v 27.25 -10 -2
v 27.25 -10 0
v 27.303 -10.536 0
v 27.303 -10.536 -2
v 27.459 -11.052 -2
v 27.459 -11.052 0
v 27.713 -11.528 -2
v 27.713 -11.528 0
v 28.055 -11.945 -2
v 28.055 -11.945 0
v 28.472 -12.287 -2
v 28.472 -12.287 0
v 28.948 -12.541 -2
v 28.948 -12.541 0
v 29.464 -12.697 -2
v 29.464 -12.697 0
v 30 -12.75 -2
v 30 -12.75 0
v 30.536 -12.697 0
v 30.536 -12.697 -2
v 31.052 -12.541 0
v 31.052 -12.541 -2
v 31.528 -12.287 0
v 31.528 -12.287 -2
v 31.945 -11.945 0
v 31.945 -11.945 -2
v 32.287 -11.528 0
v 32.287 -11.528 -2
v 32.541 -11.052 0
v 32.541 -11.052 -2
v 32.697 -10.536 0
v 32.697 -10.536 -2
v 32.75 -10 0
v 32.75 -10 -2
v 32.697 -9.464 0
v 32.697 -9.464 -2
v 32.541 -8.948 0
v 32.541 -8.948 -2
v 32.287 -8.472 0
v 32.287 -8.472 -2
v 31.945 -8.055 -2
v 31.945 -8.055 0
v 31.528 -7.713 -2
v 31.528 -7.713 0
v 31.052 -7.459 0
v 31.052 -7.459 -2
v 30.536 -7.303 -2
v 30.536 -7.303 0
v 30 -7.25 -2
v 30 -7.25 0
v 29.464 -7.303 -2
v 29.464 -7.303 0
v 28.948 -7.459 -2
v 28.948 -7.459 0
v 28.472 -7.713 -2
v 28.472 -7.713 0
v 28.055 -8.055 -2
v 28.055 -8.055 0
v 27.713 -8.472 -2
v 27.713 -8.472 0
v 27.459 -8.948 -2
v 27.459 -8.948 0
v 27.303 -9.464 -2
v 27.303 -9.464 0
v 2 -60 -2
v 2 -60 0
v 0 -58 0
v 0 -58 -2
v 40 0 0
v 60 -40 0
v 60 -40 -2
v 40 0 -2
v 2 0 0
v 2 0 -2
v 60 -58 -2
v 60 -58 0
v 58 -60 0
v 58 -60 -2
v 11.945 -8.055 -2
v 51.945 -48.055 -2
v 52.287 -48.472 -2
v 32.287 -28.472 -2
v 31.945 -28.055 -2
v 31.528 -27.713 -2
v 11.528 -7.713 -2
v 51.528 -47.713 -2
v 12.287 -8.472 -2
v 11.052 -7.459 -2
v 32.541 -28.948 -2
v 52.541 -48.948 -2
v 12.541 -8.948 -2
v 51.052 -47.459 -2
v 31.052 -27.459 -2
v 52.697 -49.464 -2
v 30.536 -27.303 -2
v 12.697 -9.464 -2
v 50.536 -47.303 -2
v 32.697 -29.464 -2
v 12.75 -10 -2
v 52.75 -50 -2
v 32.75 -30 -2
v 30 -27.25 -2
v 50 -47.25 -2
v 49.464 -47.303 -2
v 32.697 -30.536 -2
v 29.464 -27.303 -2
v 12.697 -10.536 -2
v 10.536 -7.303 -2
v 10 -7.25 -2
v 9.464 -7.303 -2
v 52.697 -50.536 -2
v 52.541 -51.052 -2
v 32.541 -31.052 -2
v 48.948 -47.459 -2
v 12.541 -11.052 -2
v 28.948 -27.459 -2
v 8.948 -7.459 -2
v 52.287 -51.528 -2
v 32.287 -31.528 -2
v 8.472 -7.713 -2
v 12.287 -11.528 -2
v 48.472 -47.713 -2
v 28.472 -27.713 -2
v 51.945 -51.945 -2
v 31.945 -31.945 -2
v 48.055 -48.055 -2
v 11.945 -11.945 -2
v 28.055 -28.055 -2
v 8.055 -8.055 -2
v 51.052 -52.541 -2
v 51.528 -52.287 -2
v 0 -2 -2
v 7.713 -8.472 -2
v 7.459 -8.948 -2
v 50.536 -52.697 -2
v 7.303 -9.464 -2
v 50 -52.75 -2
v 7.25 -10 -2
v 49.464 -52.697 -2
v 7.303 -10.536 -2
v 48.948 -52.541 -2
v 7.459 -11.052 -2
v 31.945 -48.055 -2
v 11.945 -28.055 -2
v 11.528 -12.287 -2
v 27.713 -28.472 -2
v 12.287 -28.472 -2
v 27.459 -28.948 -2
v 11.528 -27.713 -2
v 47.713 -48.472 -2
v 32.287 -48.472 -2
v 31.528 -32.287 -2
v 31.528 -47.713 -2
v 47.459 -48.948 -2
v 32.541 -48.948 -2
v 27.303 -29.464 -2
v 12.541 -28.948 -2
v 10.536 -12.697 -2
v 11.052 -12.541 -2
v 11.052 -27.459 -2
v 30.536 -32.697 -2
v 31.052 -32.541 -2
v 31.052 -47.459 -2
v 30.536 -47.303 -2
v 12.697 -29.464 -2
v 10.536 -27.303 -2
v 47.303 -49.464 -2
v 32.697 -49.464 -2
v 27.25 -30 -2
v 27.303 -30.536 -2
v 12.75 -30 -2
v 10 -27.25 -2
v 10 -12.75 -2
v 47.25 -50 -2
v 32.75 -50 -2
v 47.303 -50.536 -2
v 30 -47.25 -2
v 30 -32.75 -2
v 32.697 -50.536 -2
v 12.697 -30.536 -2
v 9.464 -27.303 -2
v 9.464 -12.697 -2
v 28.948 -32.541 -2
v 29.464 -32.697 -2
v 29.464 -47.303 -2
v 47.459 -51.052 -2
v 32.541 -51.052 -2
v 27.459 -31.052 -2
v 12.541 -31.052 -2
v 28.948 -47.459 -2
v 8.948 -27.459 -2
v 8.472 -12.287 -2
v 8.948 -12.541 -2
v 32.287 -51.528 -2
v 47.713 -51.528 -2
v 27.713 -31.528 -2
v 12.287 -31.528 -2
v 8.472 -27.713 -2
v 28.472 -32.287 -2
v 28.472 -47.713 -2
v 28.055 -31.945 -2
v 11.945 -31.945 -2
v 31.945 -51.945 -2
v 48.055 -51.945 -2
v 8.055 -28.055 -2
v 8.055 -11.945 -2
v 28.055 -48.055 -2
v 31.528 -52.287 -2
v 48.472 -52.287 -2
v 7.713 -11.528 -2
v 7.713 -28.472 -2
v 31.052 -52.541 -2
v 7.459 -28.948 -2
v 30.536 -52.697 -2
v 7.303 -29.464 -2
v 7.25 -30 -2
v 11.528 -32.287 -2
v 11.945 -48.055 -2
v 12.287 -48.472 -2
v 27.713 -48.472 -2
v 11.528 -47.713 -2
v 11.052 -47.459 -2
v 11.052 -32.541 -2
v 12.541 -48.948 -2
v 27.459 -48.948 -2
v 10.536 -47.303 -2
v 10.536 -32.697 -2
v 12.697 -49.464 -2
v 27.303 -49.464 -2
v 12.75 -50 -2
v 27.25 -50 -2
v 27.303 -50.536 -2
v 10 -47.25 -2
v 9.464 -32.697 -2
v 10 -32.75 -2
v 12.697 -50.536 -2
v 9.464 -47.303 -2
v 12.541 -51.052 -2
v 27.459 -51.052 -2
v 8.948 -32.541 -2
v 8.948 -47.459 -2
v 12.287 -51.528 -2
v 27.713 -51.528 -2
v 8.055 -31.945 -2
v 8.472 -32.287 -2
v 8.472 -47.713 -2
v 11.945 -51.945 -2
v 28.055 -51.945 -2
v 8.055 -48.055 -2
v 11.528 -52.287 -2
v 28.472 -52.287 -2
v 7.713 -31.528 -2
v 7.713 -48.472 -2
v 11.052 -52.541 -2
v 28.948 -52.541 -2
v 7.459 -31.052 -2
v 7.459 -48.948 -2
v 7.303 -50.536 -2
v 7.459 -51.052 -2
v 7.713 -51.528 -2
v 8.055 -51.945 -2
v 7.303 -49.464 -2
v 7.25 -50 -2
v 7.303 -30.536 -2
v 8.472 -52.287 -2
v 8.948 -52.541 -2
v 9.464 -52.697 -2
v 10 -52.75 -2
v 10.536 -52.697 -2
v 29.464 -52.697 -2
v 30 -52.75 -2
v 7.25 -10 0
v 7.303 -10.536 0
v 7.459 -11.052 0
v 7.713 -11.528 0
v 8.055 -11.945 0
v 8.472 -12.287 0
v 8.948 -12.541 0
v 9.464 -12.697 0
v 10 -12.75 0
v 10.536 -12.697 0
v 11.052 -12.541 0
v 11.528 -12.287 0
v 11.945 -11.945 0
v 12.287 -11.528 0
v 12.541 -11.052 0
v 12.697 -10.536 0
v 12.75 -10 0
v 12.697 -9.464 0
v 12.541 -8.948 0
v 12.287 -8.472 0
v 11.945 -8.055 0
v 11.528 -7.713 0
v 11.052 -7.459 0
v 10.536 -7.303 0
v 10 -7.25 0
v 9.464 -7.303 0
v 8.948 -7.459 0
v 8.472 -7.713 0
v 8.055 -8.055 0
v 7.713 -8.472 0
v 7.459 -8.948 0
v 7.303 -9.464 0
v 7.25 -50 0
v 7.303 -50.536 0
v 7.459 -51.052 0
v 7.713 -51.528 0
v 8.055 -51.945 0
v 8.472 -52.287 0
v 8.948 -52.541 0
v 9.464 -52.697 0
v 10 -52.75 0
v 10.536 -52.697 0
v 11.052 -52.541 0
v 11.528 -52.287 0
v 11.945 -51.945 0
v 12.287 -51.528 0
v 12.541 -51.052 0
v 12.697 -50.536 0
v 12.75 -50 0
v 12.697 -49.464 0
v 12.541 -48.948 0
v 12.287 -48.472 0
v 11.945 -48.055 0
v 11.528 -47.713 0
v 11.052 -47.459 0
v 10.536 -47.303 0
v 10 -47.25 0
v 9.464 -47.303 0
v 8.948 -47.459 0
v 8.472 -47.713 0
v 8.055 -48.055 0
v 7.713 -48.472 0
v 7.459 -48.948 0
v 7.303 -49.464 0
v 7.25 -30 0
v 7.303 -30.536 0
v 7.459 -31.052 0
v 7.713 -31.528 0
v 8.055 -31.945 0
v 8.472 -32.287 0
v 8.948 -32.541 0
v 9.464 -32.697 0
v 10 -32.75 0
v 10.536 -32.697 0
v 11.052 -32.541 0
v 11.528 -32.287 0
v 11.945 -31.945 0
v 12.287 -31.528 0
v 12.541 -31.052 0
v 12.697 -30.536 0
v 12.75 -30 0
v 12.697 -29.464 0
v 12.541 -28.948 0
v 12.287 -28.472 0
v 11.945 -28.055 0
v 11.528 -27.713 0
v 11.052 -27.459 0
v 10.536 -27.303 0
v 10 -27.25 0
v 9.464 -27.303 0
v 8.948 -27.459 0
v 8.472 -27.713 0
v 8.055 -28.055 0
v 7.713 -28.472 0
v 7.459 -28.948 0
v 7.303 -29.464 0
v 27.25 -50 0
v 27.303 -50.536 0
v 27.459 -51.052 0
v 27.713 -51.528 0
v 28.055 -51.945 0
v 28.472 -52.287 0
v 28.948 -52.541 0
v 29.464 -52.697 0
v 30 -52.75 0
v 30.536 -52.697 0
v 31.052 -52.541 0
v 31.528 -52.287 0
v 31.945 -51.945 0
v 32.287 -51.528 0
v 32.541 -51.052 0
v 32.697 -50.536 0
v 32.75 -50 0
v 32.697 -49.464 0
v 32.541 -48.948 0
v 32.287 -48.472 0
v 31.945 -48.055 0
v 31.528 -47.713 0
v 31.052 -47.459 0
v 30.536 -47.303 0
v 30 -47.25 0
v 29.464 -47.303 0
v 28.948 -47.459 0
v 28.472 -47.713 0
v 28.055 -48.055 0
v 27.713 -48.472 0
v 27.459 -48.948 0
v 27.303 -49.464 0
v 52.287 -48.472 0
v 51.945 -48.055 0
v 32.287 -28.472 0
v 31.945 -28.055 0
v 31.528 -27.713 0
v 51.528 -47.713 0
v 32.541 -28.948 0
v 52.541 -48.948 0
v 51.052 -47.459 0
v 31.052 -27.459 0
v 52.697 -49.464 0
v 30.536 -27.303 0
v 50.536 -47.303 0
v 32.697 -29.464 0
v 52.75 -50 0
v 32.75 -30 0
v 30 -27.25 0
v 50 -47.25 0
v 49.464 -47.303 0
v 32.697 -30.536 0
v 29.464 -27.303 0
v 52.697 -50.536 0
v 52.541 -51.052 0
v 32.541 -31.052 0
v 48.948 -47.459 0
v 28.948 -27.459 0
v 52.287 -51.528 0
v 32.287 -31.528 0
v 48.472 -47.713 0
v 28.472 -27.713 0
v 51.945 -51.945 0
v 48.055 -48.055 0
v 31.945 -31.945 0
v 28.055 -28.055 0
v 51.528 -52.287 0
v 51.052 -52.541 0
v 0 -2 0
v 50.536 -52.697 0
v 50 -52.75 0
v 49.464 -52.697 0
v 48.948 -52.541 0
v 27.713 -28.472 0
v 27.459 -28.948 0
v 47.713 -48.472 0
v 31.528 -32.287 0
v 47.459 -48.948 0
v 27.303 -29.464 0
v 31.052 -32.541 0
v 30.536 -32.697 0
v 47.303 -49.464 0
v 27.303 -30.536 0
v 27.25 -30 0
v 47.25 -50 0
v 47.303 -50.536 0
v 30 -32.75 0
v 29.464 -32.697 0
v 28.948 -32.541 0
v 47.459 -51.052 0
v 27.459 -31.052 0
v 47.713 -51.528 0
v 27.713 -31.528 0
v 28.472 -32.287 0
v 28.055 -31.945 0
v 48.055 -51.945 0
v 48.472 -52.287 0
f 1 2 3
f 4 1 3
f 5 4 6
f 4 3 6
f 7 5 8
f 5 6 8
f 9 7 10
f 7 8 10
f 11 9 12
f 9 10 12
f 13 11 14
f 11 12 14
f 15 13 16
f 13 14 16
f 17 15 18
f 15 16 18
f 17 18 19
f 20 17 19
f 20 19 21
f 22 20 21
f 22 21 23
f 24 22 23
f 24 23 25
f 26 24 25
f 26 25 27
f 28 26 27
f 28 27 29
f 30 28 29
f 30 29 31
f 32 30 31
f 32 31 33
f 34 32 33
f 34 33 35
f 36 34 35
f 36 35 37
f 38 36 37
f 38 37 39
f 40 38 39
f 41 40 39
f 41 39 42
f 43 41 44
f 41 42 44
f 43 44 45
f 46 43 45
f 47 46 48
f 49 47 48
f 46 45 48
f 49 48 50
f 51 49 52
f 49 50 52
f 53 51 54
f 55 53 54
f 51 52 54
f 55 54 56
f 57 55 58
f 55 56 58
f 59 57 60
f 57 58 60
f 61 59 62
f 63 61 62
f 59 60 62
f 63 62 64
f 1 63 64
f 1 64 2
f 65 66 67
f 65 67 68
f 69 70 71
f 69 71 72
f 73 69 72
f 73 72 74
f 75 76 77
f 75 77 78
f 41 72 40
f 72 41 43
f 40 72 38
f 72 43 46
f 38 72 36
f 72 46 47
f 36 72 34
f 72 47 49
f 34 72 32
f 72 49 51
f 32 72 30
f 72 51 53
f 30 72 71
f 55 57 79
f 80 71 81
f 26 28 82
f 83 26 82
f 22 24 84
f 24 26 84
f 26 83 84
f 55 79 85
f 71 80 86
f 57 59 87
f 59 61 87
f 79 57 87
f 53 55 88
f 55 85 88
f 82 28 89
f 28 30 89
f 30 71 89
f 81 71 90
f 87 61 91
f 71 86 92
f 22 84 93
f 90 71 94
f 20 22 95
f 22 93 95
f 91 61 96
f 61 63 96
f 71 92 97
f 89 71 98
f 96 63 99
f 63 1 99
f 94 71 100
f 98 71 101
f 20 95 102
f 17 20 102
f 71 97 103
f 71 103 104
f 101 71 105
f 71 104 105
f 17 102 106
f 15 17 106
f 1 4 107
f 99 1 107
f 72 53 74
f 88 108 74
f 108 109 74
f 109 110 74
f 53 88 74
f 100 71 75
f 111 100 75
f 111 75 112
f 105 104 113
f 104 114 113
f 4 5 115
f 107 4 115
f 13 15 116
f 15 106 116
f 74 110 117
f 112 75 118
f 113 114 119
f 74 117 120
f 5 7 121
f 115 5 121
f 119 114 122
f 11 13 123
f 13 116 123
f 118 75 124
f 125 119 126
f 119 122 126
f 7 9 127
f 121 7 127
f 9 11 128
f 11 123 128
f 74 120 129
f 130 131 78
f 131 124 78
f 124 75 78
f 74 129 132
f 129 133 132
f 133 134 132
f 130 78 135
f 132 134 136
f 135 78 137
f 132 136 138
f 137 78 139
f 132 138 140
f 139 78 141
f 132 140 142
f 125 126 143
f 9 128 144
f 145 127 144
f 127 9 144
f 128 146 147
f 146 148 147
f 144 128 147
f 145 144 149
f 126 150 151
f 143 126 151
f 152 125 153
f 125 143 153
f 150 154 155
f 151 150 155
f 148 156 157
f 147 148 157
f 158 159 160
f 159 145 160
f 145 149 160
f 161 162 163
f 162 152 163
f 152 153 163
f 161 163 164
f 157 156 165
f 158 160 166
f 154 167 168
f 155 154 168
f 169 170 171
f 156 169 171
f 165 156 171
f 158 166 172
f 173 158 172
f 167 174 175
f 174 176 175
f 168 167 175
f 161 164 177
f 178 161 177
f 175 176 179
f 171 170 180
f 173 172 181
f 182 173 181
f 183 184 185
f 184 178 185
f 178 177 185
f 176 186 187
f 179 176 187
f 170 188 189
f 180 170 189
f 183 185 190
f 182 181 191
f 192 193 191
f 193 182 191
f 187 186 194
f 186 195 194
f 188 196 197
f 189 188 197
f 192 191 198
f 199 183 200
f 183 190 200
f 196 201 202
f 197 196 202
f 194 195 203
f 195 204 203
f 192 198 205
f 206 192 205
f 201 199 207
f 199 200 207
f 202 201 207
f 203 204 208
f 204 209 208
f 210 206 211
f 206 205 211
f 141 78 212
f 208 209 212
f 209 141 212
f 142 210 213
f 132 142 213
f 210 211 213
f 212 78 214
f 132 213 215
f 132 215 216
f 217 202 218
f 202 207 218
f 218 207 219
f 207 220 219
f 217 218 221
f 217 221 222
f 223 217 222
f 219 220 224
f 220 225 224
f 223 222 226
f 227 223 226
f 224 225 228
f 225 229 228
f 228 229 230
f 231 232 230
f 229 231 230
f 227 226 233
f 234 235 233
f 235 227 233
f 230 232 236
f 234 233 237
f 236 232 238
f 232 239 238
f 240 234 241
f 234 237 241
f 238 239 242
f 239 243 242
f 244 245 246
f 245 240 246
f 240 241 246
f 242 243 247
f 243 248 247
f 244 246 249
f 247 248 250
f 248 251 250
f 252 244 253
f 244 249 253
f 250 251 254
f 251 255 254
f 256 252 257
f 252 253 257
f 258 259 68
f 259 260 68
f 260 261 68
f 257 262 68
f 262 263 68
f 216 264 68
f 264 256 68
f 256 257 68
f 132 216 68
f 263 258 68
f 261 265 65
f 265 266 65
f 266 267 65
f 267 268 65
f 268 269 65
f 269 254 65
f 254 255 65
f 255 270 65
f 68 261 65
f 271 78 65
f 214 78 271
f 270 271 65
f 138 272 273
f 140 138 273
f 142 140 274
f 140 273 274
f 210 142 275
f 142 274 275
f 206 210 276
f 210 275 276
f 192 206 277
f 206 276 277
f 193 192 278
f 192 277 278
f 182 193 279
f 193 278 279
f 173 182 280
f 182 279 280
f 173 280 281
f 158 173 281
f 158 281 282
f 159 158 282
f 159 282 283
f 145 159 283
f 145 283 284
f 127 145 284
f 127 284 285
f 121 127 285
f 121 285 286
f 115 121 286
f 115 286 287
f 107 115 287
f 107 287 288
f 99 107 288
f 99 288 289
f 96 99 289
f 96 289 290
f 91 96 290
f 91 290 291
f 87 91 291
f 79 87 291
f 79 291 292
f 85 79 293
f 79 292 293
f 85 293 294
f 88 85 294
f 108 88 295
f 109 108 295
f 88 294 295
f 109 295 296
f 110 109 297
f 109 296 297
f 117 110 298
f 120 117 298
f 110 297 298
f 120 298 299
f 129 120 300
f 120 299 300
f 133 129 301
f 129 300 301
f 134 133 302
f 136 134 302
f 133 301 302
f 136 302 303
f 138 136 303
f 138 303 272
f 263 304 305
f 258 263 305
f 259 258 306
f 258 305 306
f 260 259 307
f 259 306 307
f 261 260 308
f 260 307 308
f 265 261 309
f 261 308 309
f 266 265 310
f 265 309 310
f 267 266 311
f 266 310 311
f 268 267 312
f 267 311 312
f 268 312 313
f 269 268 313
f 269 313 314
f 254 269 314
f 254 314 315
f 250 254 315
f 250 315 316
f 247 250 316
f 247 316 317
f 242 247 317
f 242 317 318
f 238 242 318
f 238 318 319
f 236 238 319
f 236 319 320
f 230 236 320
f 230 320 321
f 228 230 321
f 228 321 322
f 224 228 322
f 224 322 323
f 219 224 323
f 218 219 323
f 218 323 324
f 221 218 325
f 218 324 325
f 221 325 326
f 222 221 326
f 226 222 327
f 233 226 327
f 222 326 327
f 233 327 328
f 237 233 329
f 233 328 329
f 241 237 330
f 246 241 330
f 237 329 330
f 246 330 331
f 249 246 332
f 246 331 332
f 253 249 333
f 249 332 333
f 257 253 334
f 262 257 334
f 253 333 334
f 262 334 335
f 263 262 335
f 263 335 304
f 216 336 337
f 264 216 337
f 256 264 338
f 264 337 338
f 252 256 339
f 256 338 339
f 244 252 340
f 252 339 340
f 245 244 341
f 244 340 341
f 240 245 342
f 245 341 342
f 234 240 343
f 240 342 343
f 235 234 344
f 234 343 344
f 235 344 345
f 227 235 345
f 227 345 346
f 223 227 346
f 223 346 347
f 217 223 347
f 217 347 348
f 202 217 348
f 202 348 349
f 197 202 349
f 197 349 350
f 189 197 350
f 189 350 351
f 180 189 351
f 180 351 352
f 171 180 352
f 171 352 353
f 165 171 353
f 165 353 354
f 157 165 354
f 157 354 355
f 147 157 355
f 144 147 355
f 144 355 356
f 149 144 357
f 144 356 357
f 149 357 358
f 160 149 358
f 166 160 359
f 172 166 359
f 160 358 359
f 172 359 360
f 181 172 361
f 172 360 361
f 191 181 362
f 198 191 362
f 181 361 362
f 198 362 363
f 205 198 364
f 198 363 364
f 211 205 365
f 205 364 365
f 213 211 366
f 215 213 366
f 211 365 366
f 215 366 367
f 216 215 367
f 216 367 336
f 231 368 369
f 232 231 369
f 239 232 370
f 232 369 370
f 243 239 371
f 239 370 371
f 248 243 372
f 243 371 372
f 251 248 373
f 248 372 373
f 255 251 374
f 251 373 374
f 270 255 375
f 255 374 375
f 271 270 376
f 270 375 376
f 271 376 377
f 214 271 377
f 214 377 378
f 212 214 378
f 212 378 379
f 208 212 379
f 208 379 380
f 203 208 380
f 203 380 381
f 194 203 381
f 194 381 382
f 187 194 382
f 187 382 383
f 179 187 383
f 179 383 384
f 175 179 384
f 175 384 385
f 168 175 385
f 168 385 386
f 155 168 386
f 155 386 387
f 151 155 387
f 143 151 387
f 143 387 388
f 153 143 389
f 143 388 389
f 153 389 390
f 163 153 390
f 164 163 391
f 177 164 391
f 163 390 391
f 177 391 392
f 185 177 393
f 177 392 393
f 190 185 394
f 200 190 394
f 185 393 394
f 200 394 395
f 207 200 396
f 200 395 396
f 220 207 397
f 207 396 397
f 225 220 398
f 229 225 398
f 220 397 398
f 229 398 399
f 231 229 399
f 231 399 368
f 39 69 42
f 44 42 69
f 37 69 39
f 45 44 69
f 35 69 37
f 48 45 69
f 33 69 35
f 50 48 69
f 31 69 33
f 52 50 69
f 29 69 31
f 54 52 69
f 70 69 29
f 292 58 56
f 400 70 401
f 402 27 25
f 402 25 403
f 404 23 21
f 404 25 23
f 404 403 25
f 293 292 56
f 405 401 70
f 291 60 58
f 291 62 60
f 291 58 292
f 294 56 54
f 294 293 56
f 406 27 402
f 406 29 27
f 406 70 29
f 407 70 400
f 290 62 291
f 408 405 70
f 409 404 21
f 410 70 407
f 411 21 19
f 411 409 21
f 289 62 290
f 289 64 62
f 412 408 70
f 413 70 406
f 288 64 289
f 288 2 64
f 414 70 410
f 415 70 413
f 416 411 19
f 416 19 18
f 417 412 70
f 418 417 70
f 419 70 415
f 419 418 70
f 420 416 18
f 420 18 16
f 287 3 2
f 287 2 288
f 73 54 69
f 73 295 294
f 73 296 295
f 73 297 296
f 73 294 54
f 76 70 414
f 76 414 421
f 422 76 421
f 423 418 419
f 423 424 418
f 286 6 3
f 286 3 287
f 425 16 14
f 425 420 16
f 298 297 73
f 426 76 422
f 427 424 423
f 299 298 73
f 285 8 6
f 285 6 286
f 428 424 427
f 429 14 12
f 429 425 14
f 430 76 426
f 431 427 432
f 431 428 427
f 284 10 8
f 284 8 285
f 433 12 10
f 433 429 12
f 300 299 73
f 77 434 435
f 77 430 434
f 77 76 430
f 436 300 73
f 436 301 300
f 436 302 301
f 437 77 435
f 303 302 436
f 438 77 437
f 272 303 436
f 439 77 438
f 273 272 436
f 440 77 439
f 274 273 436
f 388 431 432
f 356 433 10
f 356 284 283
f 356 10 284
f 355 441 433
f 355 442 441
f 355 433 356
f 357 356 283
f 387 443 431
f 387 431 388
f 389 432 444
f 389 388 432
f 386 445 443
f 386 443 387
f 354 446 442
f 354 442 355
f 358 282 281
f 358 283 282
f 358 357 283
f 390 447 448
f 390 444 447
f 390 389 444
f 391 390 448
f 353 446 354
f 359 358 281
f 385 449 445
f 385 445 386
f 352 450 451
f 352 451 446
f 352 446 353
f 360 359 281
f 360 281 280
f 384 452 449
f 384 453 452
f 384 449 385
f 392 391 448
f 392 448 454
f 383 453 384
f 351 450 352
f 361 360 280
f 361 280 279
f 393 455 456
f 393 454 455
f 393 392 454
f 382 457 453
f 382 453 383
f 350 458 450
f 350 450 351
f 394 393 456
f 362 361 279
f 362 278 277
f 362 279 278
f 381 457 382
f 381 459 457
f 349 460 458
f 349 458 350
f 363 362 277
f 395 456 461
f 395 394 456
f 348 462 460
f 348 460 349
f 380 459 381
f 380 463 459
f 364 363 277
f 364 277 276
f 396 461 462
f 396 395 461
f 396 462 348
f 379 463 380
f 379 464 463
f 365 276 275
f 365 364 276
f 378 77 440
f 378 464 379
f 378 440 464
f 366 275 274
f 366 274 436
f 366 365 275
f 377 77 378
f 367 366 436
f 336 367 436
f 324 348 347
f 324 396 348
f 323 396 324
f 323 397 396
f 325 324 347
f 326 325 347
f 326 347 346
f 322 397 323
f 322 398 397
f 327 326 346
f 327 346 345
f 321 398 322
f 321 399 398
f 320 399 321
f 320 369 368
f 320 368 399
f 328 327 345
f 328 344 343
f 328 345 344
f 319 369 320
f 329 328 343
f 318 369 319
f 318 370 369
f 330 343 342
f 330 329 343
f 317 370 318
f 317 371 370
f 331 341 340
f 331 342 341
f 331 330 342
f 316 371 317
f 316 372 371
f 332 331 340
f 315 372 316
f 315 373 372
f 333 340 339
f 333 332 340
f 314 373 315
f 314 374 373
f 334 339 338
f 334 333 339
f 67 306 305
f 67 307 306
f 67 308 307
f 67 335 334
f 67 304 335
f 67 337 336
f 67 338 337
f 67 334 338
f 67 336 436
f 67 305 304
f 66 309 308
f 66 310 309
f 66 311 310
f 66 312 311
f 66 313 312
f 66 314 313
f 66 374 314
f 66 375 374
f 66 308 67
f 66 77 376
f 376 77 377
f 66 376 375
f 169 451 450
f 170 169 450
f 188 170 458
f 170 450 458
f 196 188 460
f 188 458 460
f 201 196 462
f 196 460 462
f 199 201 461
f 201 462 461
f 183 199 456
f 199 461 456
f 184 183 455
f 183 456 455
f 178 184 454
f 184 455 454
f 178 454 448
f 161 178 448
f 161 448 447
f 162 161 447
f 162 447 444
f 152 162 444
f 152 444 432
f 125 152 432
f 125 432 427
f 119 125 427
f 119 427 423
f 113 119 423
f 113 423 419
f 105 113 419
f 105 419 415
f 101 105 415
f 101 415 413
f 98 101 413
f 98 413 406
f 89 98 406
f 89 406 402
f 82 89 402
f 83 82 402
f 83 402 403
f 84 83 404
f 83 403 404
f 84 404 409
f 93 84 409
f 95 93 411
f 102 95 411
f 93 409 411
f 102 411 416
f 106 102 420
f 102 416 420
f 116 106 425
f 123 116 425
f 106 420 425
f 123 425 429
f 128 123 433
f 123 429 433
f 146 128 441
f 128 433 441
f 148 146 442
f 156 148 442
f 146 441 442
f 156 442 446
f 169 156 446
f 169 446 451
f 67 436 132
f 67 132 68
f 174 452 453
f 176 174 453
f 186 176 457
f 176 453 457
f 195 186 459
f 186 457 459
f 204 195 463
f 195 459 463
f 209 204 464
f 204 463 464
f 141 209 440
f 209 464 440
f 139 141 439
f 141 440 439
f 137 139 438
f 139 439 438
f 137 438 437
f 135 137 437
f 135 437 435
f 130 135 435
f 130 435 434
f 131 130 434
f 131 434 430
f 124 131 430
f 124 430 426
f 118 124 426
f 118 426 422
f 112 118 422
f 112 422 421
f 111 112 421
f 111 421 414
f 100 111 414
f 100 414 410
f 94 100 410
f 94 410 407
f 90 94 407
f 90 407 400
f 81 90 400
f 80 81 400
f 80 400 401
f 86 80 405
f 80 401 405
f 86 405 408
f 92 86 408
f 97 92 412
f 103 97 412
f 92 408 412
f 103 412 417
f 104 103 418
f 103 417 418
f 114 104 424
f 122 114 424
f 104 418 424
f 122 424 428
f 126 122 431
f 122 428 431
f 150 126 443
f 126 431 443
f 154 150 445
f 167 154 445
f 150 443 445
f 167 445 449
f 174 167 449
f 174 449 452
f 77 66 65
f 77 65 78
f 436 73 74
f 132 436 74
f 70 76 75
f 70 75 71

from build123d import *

# Parameters (mm, degrees)
EXTRUDE_1_DEPTH   = 2
HOLE_WIZARD_M51_D = 5.5
CHAMFER_1_SIZE    = 2


with BuildPart() as part:
    # Эскиз1 → Бобышка-Вытянуть1 (new body)
    with BuildSketch(Plane(origin=(0, 0, 0), x_dir=(1, 0, 0), z_dir=(0, 0, -1))):
        Polygon((0, 0), (0, 60), (60, 60), (60, 40), (40, 0), align=None)
    extrude(amount=EXTRUDE_1_DEPTH)

    # Отверстие с зазором M51 (through all)
    with Locations(Plane(origin=(0, 0, -2), x_dir=(1, 0, 0), z_dir=(0, 0, -1))):
        with Locations((30, 50), (10, 50), (10, 30), (10, 10), (50, 50), (30, 30), (30, 10)):
            Hole(HOLE_WIZARD_M51_D / 2)

    # Фаска1
    chamfer_1_edges = [part.edges().sort_by_distance(p)[0] for p in [
        (0, 0, -1),
        (0, -60, -1),
        (60, -60, -1),
    ]]
    chamfer(chamfer_1_edges, length=CHAMFER_1_SIZE)


solid = part.part
